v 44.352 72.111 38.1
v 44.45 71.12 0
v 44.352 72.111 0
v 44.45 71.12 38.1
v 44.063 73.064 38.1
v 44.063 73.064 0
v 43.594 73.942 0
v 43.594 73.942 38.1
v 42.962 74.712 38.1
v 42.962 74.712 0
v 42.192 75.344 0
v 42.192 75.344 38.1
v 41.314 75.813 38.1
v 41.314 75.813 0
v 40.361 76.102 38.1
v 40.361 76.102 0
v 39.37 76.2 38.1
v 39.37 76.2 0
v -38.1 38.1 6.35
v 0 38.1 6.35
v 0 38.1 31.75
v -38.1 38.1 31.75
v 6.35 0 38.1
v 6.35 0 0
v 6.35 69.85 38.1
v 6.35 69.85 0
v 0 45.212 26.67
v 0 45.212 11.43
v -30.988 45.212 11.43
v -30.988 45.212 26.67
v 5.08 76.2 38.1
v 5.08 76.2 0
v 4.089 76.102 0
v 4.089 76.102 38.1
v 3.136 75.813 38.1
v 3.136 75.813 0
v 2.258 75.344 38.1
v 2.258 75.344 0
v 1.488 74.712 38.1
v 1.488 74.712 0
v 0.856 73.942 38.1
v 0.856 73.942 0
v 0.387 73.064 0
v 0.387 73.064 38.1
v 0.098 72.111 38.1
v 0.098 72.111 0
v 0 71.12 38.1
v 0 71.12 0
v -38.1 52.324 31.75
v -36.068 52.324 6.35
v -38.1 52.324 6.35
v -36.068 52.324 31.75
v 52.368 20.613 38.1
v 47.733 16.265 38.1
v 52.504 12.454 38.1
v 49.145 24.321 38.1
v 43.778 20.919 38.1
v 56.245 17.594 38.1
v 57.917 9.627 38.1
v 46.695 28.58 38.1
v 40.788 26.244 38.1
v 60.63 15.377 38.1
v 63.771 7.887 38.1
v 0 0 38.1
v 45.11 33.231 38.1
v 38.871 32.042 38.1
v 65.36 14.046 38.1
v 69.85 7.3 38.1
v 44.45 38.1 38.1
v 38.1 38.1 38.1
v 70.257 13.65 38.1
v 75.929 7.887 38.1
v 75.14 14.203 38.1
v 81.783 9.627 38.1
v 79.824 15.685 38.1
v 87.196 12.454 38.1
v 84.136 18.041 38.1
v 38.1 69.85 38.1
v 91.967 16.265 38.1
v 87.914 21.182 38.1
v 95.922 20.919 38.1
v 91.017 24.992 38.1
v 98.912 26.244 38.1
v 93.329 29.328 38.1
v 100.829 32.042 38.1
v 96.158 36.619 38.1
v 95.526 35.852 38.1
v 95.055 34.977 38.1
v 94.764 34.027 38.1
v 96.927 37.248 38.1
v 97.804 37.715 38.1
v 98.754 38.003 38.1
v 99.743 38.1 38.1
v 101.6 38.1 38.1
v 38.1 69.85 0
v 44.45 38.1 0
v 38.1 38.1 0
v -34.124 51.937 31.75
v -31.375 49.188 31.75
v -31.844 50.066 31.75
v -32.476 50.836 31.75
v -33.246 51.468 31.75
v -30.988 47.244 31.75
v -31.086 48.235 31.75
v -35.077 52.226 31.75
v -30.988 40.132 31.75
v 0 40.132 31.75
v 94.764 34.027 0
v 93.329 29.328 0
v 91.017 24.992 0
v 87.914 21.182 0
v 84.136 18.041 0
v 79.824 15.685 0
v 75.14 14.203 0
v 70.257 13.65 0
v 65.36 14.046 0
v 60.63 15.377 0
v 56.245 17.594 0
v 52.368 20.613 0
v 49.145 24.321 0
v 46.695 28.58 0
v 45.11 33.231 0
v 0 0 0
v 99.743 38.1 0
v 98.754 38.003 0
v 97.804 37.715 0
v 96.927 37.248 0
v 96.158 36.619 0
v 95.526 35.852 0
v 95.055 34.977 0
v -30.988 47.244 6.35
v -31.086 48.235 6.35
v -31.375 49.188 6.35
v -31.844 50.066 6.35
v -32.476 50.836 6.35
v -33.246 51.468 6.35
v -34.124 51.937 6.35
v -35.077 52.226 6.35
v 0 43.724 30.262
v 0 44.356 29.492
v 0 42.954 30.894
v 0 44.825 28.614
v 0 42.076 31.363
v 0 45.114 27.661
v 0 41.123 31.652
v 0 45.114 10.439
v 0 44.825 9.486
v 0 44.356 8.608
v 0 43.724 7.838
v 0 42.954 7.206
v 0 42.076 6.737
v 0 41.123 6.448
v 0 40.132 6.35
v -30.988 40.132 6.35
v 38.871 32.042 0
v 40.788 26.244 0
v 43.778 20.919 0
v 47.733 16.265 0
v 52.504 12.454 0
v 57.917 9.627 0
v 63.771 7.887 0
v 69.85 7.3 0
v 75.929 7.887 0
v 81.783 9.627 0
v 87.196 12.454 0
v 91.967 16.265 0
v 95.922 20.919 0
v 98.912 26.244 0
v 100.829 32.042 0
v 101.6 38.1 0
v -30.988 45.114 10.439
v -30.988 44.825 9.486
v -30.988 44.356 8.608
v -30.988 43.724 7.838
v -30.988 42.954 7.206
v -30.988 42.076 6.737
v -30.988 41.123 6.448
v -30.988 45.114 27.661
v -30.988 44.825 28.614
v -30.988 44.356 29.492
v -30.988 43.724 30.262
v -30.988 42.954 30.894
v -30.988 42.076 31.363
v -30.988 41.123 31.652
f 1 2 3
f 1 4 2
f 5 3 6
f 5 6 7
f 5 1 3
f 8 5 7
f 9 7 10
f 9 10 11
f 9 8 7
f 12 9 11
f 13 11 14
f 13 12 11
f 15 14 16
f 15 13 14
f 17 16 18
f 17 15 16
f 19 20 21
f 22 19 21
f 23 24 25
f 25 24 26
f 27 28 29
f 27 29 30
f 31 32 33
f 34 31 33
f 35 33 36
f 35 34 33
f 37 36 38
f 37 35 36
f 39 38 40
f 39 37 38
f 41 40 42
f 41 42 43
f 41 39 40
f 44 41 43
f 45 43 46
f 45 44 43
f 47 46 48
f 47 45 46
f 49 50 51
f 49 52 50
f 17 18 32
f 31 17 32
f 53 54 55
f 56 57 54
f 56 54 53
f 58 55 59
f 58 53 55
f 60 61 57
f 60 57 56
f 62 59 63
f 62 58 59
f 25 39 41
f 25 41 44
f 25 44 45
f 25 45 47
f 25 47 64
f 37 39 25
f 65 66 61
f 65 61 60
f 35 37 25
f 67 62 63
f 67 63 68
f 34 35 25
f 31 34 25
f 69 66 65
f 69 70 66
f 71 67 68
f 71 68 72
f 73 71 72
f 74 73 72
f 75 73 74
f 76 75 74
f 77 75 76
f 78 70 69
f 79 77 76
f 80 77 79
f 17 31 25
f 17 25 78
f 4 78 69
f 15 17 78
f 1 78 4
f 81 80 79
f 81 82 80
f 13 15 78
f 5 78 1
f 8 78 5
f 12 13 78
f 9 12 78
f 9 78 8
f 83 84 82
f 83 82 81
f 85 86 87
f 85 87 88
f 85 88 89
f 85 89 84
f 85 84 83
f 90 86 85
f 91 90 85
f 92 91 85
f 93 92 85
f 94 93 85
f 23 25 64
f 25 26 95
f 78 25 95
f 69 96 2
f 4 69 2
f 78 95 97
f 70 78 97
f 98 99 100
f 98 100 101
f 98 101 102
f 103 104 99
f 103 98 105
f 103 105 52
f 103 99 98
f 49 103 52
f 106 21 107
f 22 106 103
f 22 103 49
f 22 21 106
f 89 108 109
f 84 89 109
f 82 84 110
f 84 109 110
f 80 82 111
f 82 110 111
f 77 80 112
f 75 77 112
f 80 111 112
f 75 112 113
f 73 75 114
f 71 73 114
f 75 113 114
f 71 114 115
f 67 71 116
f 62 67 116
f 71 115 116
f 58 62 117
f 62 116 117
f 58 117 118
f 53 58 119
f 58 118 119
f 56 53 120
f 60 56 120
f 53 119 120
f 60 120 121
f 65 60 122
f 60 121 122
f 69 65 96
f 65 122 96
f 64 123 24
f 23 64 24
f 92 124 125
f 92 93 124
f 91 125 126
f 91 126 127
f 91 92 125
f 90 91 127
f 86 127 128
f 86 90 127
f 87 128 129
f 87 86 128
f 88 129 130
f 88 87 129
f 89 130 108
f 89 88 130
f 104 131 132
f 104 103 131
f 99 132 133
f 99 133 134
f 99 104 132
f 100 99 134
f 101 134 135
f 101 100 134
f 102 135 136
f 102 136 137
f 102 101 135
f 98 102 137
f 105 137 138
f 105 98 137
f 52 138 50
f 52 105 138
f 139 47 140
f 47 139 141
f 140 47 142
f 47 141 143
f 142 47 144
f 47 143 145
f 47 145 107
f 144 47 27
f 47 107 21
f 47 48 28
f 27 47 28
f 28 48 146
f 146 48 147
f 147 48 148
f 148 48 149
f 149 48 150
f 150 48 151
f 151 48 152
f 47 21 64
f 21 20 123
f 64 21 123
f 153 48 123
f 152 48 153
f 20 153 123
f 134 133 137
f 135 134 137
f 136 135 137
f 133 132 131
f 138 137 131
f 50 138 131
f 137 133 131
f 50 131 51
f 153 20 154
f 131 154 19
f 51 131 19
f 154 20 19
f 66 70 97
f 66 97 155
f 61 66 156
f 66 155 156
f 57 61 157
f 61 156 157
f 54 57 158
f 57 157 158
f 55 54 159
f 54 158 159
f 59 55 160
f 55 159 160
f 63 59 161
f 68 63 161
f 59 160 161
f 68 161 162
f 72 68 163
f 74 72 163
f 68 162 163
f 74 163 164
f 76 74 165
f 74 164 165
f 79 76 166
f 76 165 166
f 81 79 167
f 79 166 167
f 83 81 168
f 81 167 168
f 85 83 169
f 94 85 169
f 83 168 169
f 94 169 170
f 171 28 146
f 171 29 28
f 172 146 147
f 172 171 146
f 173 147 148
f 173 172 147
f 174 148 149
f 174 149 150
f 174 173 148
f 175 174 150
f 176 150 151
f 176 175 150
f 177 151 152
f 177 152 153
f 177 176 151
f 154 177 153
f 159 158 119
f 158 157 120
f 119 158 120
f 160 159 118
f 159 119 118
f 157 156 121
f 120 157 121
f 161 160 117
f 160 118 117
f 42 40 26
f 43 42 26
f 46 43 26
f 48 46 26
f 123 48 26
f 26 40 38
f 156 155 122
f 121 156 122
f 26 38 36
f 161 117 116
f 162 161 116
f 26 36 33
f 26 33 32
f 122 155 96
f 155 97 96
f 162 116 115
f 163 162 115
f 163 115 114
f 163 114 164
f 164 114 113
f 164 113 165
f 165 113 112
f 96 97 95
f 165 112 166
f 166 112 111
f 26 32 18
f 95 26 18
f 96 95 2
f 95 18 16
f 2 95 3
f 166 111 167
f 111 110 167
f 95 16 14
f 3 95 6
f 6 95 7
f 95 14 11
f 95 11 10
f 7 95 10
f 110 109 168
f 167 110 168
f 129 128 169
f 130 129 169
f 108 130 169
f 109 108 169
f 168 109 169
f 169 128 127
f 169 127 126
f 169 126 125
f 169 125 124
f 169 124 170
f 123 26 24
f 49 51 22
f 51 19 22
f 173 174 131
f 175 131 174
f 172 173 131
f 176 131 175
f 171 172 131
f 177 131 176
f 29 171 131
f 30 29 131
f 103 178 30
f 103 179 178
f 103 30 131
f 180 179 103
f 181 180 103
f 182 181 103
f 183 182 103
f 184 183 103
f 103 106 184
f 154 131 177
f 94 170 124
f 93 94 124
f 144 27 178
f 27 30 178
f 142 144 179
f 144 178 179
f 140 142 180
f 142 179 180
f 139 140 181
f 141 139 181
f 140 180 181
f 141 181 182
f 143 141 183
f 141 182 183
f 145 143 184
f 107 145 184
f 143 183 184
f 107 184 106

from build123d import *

# Parameters (mm, degrees)
F1_DEPTH = 38.1
F2_R     = 5.08
F3_R     = 5.08
F4_W     = 7.112
F4_H     = 25.4
F5_DEPTH = 38.1
F6_W     = 7.112
F6_H     = 25.4
F7_DEPTH = 7.112
F8_R     = 5.08


with BuildPart() as f1:
    # F0 (on Top) → F1 (new body)
    with BuildSketch(Plane.XY):
        with BuildLine():
            Line((0, 76.2), (0, 0))
            Line((0, 0), (6.35, 0))
            Line((6.35, 0), (6.35, 69.85))
            Line((6.35, 69.85), (38.1, 69.85))
            Line((38.1, 69.85), (38.1, 38.1))
            ThreePointArc((38.1, 38.1), (69.85, 7.30006), (101.6, 38.1))
            Line((101.6, 38.1), (95.25, 38.1))
            ThreePointArc((95.25, 38.1), (69.85, 13.646399), (44.45, 38.1))
            Line((44.45, 38.1), (44.45, 76.2))
            Line((44.45, 76.2), (0, 76.2))
        make_face()
    extrude(amount=F1_DEPTH)

    # F2
    f2_edges = [f1.edges().sort_by_distance(p)[0] for p in [
        (95.25, 38.1, 19.05),
    ]]
    fillet(f2_edges, radius=F2_R)

    # F3
    f3_edges = [f1.edges().sort_by_distance(p)[0] for p in [
        (44.45, 76.2, 19.05),
        (0, 76.2, 19.05),
    ]]
    fillet(f3_edges, radius=F3_R)

    # F4 (on face) → F5 (join)
    with BuildSketch(Plane(origin=(0, 0, 0), x_dir=(0, -1, 0), z_dir=(-1, 0, 0))):
        with Locations((-41.656, 19.05)):
            Rectangle(F4_W, F4_H)
    extrude(amount=F5_DEPTH)

    # F6 (on face) → F7 (join)
    with BuildSketch(Plane(origin=(0, 45.212, 0), x_dir=(-1, 0, 0), z_dir=(0, 1, 0))):
        with Locations((34.544, 19.05)):
            Rectangle(F6_W, F6_H)
    extrude(amount=F7_DEPTH)

    # F8
    f8_edges = [f1.edges().sort_by_distance(p)[0] for p in [
        (-15.494, 45.212, 31.75),
        (-15.494, 45.212, 6.35),
        (-30.988, 52.324, 19.05),
    ]]
    fillet(f8_edges, radius=F8_R)


solid = f1.part
